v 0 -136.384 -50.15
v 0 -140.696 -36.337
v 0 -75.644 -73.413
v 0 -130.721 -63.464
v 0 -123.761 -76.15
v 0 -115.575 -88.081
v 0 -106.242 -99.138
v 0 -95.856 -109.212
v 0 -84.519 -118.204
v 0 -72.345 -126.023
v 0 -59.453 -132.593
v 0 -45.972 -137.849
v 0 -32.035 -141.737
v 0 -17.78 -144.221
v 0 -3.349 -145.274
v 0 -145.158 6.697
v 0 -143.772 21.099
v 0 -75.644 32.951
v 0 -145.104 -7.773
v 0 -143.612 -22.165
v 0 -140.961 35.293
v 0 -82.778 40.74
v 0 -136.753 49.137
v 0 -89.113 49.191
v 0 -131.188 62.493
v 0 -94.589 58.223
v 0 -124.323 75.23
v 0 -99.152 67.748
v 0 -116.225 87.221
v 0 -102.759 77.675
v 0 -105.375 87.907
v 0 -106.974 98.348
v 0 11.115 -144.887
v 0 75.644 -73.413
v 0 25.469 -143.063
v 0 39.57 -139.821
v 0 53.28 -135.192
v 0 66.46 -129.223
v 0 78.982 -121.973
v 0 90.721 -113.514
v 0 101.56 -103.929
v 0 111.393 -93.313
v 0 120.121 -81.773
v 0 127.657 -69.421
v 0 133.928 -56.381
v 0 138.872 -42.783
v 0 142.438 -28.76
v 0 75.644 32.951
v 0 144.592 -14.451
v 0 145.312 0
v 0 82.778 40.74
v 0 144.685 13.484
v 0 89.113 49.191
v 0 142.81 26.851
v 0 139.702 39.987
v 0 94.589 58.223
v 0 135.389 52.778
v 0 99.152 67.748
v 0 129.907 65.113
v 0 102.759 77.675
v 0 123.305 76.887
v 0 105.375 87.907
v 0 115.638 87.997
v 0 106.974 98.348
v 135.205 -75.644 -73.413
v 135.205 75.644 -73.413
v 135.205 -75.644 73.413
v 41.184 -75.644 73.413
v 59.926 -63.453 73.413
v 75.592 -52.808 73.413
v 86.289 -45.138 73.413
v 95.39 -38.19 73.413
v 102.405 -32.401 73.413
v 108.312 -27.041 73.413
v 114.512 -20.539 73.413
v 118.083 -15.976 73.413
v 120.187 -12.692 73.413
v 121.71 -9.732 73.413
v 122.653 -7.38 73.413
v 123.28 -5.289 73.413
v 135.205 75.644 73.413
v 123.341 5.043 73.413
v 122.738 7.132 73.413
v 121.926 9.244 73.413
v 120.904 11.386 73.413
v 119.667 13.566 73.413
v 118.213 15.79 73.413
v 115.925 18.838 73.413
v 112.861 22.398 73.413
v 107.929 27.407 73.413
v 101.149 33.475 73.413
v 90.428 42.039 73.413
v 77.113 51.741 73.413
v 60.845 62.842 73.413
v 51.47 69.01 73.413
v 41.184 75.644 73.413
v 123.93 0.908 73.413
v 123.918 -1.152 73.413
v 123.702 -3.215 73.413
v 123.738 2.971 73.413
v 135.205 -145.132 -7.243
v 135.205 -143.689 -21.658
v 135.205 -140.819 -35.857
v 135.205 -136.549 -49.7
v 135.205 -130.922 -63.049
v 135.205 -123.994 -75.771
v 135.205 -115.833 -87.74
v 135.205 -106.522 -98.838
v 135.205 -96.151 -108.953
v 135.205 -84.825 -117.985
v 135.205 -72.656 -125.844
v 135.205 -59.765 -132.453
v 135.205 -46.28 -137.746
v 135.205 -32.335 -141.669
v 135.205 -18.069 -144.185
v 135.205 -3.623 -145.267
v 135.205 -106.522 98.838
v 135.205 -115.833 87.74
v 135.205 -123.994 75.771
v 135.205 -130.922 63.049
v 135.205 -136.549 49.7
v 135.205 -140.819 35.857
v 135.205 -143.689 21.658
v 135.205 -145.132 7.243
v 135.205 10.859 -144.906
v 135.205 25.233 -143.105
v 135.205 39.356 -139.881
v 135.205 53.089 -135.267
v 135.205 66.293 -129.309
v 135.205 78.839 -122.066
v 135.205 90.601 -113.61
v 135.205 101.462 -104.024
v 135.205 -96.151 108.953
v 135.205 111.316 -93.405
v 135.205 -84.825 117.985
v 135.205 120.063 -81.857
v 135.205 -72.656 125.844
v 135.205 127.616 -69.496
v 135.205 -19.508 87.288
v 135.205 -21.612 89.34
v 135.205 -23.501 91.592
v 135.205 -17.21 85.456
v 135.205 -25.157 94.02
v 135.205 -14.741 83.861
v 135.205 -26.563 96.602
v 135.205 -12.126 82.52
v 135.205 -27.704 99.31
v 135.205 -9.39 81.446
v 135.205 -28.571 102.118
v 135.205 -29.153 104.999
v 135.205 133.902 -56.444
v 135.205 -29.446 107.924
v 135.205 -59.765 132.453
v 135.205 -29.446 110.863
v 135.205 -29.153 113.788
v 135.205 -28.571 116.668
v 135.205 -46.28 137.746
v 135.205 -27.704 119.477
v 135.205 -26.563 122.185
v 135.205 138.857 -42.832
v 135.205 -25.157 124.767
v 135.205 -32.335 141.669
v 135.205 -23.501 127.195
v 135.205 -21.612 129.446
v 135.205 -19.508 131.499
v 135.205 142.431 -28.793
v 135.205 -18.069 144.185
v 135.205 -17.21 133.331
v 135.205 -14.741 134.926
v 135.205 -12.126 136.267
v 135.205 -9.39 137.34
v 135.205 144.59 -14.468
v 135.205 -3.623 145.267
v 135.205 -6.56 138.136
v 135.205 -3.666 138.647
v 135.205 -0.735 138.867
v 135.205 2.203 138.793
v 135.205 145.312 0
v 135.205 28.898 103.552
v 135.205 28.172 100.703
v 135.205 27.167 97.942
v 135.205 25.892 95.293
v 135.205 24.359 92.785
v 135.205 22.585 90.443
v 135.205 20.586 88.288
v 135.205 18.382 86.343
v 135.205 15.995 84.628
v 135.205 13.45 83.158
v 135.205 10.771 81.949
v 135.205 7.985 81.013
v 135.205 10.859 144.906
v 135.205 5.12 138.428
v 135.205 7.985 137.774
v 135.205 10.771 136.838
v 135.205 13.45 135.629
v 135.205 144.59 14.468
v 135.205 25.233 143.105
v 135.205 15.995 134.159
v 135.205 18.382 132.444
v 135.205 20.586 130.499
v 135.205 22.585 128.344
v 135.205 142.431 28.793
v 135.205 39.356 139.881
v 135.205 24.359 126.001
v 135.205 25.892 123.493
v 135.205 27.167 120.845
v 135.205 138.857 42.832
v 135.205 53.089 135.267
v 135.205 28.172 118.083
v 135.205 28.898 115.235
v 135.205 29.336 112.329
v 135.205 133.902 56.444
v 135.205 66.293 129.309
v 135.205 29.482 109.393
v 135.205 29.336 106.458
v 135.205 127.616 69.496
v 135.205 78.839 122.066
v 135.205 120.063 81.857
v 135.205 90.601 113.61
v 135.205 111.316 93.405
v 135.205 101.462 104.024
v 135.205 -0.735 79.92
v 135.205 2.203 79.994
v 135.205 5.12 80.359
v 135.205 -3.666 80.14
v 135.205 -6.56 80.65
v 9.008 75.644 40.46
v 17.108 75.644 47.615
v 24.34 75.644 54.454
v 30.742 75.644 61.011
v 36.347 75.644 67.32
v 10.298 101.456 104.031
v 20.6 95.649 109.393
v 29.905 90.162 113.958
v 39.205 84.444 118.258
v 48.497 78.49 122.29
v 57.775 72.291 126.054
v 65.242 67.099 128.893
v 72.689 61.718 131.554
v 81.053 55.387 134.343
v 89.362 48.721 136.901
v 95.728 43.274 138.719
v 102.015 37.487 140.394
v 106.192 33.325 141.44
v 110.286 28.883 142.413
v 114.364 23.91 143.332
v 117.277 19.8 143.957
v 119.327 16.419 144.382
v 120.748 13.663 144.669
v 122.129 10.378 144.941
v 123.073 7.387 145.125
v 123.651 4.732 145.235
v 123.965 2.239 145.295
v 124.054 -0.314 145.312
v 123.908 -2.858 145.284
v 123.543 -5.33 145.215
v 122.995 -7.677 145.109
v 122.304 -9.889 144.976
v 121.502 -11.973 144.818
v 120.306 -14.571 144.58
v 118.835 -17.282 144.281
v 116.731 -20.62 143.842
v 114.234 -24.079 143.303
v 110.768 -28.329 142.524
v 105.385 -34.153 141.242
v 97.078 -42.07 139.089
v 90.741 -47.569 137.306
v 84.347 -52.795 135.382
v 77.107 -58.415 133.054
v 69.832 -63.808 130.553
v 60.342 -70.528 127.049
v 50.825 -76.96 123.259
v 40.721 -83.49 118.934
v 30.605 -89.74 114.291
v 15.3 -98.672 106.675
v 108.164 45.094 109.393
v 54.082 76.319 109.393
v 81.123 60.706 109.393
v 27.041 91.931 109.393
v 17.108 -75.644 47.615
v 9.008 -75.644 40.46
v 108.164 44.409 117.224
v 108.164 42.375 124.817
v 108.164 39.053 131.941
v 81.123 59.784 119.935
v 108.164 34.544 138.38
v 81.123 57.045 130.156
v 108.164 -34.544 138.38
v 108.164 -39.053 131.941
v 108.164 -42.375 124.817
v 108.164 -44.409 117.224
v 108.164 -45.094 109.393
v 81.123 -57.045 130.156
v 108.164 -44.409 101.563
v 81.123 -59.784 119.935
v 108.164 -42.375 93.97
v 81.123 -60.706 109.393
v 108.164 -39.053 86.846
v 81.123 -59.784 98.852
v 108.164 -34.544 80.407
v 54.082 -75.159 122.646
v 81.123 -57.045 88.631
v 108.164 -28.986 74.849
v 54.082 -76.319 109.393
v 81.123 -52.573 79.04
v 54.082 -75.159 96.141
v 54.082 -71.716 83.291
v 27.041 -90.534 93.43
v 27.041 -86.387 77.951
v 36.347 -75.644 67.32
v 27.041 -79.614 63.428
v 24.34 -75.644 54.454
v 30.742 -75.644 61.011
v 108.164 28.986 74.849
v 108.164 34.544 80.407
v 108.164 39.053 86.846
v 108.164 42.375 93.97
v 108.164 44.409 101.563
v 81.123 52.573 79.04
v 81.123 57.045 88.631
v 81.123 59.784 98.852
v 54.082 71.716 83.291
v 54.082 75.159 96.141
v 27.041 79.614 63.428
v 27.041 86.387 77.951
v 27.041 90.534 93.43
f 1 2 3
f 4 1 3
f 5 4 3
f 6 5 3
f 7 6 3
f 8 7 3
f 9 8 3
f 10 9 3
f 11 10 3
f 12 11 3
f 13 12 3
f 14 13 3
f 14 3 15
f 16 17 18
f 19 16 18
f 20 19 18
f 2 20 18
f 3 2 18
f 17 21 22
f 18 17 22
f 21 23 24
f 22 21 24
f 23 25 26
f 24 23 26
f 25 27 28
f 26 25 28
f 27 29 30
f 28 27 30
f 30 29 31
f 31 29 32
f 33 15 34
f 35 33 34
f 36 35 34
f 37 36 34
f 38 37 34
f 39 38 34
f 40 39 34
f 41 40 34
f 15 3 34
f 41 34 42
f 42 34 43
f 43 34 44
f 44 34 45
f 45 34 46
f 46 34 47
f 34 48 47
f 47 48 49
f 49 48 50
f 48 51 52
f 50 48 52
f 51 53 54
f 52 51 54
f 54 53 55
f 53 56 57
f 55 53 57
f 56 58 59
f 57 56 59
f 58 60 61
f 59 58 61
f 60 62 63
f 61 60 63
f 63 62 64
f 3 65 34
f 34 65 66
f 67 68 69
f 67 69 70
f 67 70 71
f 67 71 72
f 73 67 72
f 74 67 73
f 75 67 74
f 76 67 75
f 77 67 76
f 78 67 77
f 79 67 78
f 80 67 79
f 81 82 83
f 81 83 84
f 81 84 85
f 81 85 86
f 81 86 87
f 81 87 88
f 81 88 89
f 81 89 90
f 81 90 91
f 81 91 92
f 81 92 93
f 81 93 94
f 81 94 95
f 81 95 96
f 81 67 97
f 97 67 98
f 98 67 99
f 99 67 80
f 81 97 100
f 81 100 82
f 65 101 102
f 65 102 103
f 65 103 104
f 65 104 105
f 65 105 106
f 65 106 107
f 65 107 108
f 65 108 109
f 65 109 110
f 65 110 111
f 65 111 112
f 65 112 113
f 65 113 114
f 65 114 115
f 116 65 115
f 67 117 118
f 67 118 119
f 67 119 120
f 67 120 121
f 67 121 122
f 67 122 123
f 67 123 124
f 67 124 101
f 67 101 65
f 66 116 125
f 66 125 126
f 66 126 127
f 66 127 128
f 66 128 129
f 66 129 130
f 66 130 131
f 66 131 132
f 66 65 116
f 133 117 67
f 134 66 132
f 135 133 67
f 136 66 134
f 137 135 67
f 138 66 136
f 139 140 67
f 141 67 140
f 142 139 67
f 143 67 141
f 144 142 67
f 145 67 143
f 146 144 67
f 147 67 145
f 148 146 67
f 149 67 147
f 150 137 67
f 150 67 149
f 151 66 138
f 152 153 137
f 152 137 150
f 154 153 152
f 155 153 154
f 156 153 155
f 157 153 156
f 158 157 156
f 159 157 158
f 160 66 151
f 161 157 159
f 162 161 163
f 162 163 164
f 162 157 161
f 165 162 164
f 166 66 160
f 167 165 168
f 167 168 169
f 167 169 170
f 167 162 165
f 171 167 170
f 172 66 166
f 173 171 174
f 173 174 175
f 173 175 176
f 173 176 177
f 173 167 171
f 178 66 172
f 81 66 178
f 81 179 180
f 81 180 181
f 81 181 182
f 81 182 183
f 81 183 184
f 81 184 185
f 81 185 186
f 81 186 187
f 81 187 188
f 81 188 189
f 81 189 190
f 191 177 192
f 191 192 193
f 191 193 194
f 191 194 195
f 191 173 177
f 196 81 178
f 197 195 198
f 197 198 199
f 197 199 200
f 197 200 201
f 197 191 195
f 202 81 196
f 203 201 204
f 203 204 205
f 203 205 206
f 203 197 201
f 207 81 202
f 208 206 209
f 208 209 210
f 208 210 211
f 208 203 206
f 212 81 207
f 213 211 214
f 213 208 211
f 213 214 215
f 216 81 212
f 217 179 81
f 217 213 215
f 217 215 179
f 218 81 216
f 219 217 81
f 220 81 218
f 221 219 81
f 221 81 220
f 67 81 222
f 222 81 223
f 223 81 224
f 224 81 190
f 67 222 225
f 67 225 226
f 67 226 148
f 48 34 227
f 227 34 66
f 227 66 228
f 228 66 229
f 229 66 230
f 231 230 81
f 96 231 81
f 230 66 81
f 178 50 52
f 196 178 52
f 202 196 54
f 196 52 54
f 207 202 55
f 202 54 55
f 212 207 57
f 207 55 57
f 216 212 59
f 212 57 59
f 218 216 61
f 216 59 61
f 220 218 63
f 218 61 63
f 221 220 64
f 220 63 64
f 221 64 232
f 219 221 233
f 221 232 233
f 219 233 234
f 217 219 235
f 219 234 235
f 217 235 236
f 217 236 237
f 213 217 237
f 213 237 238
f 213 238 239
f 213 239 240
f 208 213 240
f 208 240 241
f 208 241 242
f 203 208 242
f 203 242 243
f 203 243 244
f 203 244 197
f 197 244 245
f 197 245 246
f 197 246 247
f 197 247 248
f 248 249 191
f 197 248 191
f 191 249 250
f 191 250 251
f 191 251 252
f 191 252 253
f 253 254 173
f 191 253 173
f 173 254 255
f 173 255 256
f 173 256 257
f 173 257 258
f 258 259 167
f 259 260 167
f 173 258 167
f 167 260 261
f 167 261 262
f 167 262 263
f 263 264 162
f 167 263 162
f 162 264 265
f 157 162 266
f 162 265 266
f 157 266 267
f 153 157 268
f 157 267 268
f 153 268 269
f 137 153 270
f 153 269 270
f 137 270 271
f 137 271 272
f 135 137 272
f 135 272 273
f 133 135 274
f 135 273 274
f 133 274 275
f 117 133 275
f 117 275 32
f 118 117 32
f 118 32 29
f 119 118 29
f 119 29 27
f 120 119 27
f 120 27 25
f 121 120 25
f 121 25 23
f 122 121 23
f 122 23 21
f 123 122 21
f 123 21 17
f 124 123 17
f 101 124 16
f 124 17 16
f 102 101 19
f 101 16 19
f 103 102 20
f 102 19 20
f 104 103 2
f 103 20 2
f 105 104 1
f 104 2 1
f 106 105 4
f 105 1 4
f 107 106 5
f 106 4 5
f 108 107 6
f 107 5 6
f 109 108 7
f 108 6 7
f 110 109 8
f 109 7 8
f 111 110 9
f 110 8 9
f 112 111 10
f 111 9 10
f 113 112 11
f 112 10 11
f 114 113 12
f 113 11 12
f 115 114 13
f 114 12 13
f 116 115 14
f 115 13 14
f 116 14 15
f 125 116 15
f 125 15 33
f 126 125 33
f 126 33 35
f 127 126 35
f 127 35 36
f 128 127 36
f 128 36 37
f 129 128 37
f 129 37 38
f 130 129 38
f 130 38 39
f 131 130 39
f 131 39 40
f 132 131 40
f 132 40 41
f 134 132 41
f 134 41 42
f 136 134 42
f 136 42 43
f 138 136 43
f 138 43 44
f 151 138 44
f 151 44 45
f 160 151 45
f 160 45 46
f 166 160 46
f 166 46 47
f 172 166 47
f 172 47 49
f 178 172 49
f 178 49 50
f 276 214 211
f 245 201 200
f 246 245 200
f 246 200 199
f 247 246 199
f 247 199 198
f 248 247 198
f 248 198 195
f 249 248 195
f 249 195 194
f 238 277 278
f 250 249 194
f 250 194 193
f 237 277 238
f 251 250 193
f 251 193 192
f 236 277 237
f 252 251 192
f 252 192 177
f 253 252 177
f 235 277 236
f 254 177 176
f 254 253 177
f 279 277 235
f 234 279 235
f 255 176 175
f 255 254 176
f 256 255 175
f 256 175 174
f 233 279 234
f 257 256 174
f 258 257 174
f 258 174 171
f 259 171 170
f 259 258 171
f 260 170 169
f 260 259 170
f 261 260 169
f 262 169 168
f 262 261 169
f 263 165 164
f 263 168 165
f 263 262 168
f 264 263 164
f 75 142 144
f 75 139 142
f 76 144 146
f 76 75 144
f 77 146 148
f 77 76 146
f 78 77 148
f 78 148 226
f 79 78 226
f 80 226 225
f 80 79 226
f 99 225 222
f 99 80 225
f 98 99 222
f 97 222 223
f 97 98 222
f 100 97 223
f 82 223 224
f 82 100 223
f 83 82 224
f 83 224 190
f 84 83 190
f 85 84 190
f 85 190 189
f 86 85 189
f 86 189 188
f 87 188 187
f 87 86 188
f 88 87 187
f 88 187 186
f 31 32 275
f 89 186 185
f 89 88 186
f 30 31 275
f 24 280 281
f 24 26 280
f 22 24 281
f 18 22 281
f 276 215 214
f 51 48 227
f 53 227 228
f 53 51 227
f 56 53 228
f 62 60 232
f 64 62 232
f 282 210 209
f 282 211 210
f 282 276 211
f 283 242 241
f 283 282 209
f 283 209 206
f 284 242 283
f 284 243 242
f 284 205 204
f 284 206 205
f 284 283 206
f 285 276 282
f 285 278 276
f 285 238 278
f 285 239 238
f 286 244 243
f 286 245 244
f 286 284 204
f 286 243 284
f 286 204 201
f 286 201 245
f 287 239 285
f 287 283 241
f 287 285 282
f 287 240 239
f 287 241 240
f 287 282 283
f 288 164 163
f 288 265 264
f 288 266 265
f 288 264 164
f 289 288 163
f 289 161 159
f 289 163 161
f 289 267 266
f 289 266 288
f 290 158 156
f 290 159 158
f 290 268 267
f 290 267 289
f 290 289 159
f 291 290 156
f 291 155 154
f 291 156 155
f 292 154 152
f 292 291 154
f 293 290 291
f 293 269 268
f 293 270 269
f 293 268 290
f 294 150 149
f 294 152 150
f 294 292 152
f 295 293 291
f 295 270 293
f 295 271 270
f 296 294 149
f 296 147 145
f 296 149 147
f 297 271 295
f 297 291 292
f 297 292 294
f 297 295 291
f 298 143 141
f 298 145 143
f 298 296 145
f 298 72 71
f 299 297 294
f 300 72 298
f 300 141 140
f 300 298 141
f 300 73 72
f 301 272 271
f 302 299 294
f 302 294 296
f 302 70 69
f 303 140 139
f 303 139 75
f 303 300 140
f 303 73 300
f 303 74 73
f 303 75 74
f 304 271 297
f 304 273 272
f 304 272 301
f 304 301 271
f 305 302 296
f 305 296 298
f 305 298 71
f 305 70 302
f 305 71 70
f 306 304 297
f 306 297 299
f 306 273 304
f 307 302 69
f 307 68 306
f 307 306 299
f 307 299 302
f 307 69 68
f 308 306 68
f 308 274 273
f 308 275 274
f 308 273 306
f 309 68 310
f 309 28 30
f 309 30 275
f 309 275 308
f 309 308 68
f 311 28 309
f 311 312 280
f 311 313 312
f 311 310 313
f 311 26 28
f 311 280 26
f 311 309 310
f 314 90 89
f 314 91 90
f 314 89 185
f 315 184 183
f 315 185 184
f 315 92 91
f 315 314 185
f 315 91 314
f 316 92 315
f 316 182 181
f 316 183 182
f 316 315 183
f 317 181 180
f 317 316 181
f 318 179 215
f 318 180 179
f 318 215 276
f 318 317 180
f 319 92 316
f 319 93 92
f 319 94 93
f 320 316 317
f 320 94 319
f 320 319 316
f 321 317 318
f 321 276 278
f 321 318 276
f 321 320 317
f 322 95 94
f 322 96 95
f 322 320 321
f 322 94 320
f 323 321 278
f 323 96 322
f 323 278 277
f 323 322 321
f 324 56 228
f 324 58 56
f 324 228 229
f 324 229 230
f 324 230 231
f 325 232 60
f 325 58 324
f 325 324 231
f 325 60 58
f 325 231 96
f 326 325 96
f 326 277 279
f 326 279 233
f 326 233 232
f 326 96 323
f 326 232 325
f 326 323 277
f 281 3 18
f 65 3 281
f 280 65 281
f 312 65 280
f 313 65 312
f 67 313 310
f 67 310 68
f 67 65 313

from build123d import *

# Parameters (mm, degrees)
F1_DEPTH = 67.31
F3_DEPTH = 91.186
F4_R     = 145.3123956035
F5_DEPTH = 135.2049764246
F6_W     = 151.2885987759
F6_H     = 146.8262225389
F7_DEPTH = 219.4037679583
F8_R     = 29.4822475013
F9_DEPTH = 135.2059764246
F9_TAPER = -30


# Not quite as in the source:
# - a feature of the source that left no trace in its solid (it failed there, or was rolled back) is left out


with BuildPart() as f1:
    # F0 (on Top) → F1 (new body)
    with BuildSketch(Plane.XY):
        Polygon((45.1956306257, 12.500264471), (26.5868465743, 38.6269495137), (-4.4622184691, 46.6796555882), (-33.4233618988, 32.8904320264), (-46.7453428367, 3.711409783), (-38.1946583448, -27.2042223456), (-11.7722687269, -45.3906964974), (20.1584962624, -42.3383592967), (42.6568768139, -19.4754332426), align=None)
    extrude(amount=F1_DEPTH)

    # F2 (on face) → F3 (cut)
    with BuildSketch(Plane.XY.offset(67.31)):
        Polygon((13.3602926508, -6.4339778404), (13.3602926508, 6.4339778404), (3.2997197844, 14.4570169783), (-9.2456093816, 11.593627462), (-14.8288061072, 0), (-9.2456093816, -11.593627462), (3.2997197844, -14.4570169783), align=None)
    extrude(amount=-F3_DEPTH, mode=Mode.SUBTRACT)

    # F4 (on Right) → F5 (join)
    with BuildSketch(Plane.YZ):
        Circle(F4_R)
    extrude(amount=F5_DEPTH)

    # F6 (on face) → F7 (cut)
    with BuildSketch(Plane.YZ.offset(135.2049764246)):
        Rectangle(F6_W, F6_H)
    extrude(amount=-F7_DEPTH, mode=Mode.SUBTRACT)

    # F8 (on face) → F9 (cut, through all)
    with BuildSketch(Plane.YZ.offset(135.2049764246)):
        with Locations((0, 109.3934327364)):
            Circle(F8_R)
    extrude(amount=-F9_DEPTH, taper=F9_TAPER, mode=Mode.SUBTRACT)


solid = f1.part
